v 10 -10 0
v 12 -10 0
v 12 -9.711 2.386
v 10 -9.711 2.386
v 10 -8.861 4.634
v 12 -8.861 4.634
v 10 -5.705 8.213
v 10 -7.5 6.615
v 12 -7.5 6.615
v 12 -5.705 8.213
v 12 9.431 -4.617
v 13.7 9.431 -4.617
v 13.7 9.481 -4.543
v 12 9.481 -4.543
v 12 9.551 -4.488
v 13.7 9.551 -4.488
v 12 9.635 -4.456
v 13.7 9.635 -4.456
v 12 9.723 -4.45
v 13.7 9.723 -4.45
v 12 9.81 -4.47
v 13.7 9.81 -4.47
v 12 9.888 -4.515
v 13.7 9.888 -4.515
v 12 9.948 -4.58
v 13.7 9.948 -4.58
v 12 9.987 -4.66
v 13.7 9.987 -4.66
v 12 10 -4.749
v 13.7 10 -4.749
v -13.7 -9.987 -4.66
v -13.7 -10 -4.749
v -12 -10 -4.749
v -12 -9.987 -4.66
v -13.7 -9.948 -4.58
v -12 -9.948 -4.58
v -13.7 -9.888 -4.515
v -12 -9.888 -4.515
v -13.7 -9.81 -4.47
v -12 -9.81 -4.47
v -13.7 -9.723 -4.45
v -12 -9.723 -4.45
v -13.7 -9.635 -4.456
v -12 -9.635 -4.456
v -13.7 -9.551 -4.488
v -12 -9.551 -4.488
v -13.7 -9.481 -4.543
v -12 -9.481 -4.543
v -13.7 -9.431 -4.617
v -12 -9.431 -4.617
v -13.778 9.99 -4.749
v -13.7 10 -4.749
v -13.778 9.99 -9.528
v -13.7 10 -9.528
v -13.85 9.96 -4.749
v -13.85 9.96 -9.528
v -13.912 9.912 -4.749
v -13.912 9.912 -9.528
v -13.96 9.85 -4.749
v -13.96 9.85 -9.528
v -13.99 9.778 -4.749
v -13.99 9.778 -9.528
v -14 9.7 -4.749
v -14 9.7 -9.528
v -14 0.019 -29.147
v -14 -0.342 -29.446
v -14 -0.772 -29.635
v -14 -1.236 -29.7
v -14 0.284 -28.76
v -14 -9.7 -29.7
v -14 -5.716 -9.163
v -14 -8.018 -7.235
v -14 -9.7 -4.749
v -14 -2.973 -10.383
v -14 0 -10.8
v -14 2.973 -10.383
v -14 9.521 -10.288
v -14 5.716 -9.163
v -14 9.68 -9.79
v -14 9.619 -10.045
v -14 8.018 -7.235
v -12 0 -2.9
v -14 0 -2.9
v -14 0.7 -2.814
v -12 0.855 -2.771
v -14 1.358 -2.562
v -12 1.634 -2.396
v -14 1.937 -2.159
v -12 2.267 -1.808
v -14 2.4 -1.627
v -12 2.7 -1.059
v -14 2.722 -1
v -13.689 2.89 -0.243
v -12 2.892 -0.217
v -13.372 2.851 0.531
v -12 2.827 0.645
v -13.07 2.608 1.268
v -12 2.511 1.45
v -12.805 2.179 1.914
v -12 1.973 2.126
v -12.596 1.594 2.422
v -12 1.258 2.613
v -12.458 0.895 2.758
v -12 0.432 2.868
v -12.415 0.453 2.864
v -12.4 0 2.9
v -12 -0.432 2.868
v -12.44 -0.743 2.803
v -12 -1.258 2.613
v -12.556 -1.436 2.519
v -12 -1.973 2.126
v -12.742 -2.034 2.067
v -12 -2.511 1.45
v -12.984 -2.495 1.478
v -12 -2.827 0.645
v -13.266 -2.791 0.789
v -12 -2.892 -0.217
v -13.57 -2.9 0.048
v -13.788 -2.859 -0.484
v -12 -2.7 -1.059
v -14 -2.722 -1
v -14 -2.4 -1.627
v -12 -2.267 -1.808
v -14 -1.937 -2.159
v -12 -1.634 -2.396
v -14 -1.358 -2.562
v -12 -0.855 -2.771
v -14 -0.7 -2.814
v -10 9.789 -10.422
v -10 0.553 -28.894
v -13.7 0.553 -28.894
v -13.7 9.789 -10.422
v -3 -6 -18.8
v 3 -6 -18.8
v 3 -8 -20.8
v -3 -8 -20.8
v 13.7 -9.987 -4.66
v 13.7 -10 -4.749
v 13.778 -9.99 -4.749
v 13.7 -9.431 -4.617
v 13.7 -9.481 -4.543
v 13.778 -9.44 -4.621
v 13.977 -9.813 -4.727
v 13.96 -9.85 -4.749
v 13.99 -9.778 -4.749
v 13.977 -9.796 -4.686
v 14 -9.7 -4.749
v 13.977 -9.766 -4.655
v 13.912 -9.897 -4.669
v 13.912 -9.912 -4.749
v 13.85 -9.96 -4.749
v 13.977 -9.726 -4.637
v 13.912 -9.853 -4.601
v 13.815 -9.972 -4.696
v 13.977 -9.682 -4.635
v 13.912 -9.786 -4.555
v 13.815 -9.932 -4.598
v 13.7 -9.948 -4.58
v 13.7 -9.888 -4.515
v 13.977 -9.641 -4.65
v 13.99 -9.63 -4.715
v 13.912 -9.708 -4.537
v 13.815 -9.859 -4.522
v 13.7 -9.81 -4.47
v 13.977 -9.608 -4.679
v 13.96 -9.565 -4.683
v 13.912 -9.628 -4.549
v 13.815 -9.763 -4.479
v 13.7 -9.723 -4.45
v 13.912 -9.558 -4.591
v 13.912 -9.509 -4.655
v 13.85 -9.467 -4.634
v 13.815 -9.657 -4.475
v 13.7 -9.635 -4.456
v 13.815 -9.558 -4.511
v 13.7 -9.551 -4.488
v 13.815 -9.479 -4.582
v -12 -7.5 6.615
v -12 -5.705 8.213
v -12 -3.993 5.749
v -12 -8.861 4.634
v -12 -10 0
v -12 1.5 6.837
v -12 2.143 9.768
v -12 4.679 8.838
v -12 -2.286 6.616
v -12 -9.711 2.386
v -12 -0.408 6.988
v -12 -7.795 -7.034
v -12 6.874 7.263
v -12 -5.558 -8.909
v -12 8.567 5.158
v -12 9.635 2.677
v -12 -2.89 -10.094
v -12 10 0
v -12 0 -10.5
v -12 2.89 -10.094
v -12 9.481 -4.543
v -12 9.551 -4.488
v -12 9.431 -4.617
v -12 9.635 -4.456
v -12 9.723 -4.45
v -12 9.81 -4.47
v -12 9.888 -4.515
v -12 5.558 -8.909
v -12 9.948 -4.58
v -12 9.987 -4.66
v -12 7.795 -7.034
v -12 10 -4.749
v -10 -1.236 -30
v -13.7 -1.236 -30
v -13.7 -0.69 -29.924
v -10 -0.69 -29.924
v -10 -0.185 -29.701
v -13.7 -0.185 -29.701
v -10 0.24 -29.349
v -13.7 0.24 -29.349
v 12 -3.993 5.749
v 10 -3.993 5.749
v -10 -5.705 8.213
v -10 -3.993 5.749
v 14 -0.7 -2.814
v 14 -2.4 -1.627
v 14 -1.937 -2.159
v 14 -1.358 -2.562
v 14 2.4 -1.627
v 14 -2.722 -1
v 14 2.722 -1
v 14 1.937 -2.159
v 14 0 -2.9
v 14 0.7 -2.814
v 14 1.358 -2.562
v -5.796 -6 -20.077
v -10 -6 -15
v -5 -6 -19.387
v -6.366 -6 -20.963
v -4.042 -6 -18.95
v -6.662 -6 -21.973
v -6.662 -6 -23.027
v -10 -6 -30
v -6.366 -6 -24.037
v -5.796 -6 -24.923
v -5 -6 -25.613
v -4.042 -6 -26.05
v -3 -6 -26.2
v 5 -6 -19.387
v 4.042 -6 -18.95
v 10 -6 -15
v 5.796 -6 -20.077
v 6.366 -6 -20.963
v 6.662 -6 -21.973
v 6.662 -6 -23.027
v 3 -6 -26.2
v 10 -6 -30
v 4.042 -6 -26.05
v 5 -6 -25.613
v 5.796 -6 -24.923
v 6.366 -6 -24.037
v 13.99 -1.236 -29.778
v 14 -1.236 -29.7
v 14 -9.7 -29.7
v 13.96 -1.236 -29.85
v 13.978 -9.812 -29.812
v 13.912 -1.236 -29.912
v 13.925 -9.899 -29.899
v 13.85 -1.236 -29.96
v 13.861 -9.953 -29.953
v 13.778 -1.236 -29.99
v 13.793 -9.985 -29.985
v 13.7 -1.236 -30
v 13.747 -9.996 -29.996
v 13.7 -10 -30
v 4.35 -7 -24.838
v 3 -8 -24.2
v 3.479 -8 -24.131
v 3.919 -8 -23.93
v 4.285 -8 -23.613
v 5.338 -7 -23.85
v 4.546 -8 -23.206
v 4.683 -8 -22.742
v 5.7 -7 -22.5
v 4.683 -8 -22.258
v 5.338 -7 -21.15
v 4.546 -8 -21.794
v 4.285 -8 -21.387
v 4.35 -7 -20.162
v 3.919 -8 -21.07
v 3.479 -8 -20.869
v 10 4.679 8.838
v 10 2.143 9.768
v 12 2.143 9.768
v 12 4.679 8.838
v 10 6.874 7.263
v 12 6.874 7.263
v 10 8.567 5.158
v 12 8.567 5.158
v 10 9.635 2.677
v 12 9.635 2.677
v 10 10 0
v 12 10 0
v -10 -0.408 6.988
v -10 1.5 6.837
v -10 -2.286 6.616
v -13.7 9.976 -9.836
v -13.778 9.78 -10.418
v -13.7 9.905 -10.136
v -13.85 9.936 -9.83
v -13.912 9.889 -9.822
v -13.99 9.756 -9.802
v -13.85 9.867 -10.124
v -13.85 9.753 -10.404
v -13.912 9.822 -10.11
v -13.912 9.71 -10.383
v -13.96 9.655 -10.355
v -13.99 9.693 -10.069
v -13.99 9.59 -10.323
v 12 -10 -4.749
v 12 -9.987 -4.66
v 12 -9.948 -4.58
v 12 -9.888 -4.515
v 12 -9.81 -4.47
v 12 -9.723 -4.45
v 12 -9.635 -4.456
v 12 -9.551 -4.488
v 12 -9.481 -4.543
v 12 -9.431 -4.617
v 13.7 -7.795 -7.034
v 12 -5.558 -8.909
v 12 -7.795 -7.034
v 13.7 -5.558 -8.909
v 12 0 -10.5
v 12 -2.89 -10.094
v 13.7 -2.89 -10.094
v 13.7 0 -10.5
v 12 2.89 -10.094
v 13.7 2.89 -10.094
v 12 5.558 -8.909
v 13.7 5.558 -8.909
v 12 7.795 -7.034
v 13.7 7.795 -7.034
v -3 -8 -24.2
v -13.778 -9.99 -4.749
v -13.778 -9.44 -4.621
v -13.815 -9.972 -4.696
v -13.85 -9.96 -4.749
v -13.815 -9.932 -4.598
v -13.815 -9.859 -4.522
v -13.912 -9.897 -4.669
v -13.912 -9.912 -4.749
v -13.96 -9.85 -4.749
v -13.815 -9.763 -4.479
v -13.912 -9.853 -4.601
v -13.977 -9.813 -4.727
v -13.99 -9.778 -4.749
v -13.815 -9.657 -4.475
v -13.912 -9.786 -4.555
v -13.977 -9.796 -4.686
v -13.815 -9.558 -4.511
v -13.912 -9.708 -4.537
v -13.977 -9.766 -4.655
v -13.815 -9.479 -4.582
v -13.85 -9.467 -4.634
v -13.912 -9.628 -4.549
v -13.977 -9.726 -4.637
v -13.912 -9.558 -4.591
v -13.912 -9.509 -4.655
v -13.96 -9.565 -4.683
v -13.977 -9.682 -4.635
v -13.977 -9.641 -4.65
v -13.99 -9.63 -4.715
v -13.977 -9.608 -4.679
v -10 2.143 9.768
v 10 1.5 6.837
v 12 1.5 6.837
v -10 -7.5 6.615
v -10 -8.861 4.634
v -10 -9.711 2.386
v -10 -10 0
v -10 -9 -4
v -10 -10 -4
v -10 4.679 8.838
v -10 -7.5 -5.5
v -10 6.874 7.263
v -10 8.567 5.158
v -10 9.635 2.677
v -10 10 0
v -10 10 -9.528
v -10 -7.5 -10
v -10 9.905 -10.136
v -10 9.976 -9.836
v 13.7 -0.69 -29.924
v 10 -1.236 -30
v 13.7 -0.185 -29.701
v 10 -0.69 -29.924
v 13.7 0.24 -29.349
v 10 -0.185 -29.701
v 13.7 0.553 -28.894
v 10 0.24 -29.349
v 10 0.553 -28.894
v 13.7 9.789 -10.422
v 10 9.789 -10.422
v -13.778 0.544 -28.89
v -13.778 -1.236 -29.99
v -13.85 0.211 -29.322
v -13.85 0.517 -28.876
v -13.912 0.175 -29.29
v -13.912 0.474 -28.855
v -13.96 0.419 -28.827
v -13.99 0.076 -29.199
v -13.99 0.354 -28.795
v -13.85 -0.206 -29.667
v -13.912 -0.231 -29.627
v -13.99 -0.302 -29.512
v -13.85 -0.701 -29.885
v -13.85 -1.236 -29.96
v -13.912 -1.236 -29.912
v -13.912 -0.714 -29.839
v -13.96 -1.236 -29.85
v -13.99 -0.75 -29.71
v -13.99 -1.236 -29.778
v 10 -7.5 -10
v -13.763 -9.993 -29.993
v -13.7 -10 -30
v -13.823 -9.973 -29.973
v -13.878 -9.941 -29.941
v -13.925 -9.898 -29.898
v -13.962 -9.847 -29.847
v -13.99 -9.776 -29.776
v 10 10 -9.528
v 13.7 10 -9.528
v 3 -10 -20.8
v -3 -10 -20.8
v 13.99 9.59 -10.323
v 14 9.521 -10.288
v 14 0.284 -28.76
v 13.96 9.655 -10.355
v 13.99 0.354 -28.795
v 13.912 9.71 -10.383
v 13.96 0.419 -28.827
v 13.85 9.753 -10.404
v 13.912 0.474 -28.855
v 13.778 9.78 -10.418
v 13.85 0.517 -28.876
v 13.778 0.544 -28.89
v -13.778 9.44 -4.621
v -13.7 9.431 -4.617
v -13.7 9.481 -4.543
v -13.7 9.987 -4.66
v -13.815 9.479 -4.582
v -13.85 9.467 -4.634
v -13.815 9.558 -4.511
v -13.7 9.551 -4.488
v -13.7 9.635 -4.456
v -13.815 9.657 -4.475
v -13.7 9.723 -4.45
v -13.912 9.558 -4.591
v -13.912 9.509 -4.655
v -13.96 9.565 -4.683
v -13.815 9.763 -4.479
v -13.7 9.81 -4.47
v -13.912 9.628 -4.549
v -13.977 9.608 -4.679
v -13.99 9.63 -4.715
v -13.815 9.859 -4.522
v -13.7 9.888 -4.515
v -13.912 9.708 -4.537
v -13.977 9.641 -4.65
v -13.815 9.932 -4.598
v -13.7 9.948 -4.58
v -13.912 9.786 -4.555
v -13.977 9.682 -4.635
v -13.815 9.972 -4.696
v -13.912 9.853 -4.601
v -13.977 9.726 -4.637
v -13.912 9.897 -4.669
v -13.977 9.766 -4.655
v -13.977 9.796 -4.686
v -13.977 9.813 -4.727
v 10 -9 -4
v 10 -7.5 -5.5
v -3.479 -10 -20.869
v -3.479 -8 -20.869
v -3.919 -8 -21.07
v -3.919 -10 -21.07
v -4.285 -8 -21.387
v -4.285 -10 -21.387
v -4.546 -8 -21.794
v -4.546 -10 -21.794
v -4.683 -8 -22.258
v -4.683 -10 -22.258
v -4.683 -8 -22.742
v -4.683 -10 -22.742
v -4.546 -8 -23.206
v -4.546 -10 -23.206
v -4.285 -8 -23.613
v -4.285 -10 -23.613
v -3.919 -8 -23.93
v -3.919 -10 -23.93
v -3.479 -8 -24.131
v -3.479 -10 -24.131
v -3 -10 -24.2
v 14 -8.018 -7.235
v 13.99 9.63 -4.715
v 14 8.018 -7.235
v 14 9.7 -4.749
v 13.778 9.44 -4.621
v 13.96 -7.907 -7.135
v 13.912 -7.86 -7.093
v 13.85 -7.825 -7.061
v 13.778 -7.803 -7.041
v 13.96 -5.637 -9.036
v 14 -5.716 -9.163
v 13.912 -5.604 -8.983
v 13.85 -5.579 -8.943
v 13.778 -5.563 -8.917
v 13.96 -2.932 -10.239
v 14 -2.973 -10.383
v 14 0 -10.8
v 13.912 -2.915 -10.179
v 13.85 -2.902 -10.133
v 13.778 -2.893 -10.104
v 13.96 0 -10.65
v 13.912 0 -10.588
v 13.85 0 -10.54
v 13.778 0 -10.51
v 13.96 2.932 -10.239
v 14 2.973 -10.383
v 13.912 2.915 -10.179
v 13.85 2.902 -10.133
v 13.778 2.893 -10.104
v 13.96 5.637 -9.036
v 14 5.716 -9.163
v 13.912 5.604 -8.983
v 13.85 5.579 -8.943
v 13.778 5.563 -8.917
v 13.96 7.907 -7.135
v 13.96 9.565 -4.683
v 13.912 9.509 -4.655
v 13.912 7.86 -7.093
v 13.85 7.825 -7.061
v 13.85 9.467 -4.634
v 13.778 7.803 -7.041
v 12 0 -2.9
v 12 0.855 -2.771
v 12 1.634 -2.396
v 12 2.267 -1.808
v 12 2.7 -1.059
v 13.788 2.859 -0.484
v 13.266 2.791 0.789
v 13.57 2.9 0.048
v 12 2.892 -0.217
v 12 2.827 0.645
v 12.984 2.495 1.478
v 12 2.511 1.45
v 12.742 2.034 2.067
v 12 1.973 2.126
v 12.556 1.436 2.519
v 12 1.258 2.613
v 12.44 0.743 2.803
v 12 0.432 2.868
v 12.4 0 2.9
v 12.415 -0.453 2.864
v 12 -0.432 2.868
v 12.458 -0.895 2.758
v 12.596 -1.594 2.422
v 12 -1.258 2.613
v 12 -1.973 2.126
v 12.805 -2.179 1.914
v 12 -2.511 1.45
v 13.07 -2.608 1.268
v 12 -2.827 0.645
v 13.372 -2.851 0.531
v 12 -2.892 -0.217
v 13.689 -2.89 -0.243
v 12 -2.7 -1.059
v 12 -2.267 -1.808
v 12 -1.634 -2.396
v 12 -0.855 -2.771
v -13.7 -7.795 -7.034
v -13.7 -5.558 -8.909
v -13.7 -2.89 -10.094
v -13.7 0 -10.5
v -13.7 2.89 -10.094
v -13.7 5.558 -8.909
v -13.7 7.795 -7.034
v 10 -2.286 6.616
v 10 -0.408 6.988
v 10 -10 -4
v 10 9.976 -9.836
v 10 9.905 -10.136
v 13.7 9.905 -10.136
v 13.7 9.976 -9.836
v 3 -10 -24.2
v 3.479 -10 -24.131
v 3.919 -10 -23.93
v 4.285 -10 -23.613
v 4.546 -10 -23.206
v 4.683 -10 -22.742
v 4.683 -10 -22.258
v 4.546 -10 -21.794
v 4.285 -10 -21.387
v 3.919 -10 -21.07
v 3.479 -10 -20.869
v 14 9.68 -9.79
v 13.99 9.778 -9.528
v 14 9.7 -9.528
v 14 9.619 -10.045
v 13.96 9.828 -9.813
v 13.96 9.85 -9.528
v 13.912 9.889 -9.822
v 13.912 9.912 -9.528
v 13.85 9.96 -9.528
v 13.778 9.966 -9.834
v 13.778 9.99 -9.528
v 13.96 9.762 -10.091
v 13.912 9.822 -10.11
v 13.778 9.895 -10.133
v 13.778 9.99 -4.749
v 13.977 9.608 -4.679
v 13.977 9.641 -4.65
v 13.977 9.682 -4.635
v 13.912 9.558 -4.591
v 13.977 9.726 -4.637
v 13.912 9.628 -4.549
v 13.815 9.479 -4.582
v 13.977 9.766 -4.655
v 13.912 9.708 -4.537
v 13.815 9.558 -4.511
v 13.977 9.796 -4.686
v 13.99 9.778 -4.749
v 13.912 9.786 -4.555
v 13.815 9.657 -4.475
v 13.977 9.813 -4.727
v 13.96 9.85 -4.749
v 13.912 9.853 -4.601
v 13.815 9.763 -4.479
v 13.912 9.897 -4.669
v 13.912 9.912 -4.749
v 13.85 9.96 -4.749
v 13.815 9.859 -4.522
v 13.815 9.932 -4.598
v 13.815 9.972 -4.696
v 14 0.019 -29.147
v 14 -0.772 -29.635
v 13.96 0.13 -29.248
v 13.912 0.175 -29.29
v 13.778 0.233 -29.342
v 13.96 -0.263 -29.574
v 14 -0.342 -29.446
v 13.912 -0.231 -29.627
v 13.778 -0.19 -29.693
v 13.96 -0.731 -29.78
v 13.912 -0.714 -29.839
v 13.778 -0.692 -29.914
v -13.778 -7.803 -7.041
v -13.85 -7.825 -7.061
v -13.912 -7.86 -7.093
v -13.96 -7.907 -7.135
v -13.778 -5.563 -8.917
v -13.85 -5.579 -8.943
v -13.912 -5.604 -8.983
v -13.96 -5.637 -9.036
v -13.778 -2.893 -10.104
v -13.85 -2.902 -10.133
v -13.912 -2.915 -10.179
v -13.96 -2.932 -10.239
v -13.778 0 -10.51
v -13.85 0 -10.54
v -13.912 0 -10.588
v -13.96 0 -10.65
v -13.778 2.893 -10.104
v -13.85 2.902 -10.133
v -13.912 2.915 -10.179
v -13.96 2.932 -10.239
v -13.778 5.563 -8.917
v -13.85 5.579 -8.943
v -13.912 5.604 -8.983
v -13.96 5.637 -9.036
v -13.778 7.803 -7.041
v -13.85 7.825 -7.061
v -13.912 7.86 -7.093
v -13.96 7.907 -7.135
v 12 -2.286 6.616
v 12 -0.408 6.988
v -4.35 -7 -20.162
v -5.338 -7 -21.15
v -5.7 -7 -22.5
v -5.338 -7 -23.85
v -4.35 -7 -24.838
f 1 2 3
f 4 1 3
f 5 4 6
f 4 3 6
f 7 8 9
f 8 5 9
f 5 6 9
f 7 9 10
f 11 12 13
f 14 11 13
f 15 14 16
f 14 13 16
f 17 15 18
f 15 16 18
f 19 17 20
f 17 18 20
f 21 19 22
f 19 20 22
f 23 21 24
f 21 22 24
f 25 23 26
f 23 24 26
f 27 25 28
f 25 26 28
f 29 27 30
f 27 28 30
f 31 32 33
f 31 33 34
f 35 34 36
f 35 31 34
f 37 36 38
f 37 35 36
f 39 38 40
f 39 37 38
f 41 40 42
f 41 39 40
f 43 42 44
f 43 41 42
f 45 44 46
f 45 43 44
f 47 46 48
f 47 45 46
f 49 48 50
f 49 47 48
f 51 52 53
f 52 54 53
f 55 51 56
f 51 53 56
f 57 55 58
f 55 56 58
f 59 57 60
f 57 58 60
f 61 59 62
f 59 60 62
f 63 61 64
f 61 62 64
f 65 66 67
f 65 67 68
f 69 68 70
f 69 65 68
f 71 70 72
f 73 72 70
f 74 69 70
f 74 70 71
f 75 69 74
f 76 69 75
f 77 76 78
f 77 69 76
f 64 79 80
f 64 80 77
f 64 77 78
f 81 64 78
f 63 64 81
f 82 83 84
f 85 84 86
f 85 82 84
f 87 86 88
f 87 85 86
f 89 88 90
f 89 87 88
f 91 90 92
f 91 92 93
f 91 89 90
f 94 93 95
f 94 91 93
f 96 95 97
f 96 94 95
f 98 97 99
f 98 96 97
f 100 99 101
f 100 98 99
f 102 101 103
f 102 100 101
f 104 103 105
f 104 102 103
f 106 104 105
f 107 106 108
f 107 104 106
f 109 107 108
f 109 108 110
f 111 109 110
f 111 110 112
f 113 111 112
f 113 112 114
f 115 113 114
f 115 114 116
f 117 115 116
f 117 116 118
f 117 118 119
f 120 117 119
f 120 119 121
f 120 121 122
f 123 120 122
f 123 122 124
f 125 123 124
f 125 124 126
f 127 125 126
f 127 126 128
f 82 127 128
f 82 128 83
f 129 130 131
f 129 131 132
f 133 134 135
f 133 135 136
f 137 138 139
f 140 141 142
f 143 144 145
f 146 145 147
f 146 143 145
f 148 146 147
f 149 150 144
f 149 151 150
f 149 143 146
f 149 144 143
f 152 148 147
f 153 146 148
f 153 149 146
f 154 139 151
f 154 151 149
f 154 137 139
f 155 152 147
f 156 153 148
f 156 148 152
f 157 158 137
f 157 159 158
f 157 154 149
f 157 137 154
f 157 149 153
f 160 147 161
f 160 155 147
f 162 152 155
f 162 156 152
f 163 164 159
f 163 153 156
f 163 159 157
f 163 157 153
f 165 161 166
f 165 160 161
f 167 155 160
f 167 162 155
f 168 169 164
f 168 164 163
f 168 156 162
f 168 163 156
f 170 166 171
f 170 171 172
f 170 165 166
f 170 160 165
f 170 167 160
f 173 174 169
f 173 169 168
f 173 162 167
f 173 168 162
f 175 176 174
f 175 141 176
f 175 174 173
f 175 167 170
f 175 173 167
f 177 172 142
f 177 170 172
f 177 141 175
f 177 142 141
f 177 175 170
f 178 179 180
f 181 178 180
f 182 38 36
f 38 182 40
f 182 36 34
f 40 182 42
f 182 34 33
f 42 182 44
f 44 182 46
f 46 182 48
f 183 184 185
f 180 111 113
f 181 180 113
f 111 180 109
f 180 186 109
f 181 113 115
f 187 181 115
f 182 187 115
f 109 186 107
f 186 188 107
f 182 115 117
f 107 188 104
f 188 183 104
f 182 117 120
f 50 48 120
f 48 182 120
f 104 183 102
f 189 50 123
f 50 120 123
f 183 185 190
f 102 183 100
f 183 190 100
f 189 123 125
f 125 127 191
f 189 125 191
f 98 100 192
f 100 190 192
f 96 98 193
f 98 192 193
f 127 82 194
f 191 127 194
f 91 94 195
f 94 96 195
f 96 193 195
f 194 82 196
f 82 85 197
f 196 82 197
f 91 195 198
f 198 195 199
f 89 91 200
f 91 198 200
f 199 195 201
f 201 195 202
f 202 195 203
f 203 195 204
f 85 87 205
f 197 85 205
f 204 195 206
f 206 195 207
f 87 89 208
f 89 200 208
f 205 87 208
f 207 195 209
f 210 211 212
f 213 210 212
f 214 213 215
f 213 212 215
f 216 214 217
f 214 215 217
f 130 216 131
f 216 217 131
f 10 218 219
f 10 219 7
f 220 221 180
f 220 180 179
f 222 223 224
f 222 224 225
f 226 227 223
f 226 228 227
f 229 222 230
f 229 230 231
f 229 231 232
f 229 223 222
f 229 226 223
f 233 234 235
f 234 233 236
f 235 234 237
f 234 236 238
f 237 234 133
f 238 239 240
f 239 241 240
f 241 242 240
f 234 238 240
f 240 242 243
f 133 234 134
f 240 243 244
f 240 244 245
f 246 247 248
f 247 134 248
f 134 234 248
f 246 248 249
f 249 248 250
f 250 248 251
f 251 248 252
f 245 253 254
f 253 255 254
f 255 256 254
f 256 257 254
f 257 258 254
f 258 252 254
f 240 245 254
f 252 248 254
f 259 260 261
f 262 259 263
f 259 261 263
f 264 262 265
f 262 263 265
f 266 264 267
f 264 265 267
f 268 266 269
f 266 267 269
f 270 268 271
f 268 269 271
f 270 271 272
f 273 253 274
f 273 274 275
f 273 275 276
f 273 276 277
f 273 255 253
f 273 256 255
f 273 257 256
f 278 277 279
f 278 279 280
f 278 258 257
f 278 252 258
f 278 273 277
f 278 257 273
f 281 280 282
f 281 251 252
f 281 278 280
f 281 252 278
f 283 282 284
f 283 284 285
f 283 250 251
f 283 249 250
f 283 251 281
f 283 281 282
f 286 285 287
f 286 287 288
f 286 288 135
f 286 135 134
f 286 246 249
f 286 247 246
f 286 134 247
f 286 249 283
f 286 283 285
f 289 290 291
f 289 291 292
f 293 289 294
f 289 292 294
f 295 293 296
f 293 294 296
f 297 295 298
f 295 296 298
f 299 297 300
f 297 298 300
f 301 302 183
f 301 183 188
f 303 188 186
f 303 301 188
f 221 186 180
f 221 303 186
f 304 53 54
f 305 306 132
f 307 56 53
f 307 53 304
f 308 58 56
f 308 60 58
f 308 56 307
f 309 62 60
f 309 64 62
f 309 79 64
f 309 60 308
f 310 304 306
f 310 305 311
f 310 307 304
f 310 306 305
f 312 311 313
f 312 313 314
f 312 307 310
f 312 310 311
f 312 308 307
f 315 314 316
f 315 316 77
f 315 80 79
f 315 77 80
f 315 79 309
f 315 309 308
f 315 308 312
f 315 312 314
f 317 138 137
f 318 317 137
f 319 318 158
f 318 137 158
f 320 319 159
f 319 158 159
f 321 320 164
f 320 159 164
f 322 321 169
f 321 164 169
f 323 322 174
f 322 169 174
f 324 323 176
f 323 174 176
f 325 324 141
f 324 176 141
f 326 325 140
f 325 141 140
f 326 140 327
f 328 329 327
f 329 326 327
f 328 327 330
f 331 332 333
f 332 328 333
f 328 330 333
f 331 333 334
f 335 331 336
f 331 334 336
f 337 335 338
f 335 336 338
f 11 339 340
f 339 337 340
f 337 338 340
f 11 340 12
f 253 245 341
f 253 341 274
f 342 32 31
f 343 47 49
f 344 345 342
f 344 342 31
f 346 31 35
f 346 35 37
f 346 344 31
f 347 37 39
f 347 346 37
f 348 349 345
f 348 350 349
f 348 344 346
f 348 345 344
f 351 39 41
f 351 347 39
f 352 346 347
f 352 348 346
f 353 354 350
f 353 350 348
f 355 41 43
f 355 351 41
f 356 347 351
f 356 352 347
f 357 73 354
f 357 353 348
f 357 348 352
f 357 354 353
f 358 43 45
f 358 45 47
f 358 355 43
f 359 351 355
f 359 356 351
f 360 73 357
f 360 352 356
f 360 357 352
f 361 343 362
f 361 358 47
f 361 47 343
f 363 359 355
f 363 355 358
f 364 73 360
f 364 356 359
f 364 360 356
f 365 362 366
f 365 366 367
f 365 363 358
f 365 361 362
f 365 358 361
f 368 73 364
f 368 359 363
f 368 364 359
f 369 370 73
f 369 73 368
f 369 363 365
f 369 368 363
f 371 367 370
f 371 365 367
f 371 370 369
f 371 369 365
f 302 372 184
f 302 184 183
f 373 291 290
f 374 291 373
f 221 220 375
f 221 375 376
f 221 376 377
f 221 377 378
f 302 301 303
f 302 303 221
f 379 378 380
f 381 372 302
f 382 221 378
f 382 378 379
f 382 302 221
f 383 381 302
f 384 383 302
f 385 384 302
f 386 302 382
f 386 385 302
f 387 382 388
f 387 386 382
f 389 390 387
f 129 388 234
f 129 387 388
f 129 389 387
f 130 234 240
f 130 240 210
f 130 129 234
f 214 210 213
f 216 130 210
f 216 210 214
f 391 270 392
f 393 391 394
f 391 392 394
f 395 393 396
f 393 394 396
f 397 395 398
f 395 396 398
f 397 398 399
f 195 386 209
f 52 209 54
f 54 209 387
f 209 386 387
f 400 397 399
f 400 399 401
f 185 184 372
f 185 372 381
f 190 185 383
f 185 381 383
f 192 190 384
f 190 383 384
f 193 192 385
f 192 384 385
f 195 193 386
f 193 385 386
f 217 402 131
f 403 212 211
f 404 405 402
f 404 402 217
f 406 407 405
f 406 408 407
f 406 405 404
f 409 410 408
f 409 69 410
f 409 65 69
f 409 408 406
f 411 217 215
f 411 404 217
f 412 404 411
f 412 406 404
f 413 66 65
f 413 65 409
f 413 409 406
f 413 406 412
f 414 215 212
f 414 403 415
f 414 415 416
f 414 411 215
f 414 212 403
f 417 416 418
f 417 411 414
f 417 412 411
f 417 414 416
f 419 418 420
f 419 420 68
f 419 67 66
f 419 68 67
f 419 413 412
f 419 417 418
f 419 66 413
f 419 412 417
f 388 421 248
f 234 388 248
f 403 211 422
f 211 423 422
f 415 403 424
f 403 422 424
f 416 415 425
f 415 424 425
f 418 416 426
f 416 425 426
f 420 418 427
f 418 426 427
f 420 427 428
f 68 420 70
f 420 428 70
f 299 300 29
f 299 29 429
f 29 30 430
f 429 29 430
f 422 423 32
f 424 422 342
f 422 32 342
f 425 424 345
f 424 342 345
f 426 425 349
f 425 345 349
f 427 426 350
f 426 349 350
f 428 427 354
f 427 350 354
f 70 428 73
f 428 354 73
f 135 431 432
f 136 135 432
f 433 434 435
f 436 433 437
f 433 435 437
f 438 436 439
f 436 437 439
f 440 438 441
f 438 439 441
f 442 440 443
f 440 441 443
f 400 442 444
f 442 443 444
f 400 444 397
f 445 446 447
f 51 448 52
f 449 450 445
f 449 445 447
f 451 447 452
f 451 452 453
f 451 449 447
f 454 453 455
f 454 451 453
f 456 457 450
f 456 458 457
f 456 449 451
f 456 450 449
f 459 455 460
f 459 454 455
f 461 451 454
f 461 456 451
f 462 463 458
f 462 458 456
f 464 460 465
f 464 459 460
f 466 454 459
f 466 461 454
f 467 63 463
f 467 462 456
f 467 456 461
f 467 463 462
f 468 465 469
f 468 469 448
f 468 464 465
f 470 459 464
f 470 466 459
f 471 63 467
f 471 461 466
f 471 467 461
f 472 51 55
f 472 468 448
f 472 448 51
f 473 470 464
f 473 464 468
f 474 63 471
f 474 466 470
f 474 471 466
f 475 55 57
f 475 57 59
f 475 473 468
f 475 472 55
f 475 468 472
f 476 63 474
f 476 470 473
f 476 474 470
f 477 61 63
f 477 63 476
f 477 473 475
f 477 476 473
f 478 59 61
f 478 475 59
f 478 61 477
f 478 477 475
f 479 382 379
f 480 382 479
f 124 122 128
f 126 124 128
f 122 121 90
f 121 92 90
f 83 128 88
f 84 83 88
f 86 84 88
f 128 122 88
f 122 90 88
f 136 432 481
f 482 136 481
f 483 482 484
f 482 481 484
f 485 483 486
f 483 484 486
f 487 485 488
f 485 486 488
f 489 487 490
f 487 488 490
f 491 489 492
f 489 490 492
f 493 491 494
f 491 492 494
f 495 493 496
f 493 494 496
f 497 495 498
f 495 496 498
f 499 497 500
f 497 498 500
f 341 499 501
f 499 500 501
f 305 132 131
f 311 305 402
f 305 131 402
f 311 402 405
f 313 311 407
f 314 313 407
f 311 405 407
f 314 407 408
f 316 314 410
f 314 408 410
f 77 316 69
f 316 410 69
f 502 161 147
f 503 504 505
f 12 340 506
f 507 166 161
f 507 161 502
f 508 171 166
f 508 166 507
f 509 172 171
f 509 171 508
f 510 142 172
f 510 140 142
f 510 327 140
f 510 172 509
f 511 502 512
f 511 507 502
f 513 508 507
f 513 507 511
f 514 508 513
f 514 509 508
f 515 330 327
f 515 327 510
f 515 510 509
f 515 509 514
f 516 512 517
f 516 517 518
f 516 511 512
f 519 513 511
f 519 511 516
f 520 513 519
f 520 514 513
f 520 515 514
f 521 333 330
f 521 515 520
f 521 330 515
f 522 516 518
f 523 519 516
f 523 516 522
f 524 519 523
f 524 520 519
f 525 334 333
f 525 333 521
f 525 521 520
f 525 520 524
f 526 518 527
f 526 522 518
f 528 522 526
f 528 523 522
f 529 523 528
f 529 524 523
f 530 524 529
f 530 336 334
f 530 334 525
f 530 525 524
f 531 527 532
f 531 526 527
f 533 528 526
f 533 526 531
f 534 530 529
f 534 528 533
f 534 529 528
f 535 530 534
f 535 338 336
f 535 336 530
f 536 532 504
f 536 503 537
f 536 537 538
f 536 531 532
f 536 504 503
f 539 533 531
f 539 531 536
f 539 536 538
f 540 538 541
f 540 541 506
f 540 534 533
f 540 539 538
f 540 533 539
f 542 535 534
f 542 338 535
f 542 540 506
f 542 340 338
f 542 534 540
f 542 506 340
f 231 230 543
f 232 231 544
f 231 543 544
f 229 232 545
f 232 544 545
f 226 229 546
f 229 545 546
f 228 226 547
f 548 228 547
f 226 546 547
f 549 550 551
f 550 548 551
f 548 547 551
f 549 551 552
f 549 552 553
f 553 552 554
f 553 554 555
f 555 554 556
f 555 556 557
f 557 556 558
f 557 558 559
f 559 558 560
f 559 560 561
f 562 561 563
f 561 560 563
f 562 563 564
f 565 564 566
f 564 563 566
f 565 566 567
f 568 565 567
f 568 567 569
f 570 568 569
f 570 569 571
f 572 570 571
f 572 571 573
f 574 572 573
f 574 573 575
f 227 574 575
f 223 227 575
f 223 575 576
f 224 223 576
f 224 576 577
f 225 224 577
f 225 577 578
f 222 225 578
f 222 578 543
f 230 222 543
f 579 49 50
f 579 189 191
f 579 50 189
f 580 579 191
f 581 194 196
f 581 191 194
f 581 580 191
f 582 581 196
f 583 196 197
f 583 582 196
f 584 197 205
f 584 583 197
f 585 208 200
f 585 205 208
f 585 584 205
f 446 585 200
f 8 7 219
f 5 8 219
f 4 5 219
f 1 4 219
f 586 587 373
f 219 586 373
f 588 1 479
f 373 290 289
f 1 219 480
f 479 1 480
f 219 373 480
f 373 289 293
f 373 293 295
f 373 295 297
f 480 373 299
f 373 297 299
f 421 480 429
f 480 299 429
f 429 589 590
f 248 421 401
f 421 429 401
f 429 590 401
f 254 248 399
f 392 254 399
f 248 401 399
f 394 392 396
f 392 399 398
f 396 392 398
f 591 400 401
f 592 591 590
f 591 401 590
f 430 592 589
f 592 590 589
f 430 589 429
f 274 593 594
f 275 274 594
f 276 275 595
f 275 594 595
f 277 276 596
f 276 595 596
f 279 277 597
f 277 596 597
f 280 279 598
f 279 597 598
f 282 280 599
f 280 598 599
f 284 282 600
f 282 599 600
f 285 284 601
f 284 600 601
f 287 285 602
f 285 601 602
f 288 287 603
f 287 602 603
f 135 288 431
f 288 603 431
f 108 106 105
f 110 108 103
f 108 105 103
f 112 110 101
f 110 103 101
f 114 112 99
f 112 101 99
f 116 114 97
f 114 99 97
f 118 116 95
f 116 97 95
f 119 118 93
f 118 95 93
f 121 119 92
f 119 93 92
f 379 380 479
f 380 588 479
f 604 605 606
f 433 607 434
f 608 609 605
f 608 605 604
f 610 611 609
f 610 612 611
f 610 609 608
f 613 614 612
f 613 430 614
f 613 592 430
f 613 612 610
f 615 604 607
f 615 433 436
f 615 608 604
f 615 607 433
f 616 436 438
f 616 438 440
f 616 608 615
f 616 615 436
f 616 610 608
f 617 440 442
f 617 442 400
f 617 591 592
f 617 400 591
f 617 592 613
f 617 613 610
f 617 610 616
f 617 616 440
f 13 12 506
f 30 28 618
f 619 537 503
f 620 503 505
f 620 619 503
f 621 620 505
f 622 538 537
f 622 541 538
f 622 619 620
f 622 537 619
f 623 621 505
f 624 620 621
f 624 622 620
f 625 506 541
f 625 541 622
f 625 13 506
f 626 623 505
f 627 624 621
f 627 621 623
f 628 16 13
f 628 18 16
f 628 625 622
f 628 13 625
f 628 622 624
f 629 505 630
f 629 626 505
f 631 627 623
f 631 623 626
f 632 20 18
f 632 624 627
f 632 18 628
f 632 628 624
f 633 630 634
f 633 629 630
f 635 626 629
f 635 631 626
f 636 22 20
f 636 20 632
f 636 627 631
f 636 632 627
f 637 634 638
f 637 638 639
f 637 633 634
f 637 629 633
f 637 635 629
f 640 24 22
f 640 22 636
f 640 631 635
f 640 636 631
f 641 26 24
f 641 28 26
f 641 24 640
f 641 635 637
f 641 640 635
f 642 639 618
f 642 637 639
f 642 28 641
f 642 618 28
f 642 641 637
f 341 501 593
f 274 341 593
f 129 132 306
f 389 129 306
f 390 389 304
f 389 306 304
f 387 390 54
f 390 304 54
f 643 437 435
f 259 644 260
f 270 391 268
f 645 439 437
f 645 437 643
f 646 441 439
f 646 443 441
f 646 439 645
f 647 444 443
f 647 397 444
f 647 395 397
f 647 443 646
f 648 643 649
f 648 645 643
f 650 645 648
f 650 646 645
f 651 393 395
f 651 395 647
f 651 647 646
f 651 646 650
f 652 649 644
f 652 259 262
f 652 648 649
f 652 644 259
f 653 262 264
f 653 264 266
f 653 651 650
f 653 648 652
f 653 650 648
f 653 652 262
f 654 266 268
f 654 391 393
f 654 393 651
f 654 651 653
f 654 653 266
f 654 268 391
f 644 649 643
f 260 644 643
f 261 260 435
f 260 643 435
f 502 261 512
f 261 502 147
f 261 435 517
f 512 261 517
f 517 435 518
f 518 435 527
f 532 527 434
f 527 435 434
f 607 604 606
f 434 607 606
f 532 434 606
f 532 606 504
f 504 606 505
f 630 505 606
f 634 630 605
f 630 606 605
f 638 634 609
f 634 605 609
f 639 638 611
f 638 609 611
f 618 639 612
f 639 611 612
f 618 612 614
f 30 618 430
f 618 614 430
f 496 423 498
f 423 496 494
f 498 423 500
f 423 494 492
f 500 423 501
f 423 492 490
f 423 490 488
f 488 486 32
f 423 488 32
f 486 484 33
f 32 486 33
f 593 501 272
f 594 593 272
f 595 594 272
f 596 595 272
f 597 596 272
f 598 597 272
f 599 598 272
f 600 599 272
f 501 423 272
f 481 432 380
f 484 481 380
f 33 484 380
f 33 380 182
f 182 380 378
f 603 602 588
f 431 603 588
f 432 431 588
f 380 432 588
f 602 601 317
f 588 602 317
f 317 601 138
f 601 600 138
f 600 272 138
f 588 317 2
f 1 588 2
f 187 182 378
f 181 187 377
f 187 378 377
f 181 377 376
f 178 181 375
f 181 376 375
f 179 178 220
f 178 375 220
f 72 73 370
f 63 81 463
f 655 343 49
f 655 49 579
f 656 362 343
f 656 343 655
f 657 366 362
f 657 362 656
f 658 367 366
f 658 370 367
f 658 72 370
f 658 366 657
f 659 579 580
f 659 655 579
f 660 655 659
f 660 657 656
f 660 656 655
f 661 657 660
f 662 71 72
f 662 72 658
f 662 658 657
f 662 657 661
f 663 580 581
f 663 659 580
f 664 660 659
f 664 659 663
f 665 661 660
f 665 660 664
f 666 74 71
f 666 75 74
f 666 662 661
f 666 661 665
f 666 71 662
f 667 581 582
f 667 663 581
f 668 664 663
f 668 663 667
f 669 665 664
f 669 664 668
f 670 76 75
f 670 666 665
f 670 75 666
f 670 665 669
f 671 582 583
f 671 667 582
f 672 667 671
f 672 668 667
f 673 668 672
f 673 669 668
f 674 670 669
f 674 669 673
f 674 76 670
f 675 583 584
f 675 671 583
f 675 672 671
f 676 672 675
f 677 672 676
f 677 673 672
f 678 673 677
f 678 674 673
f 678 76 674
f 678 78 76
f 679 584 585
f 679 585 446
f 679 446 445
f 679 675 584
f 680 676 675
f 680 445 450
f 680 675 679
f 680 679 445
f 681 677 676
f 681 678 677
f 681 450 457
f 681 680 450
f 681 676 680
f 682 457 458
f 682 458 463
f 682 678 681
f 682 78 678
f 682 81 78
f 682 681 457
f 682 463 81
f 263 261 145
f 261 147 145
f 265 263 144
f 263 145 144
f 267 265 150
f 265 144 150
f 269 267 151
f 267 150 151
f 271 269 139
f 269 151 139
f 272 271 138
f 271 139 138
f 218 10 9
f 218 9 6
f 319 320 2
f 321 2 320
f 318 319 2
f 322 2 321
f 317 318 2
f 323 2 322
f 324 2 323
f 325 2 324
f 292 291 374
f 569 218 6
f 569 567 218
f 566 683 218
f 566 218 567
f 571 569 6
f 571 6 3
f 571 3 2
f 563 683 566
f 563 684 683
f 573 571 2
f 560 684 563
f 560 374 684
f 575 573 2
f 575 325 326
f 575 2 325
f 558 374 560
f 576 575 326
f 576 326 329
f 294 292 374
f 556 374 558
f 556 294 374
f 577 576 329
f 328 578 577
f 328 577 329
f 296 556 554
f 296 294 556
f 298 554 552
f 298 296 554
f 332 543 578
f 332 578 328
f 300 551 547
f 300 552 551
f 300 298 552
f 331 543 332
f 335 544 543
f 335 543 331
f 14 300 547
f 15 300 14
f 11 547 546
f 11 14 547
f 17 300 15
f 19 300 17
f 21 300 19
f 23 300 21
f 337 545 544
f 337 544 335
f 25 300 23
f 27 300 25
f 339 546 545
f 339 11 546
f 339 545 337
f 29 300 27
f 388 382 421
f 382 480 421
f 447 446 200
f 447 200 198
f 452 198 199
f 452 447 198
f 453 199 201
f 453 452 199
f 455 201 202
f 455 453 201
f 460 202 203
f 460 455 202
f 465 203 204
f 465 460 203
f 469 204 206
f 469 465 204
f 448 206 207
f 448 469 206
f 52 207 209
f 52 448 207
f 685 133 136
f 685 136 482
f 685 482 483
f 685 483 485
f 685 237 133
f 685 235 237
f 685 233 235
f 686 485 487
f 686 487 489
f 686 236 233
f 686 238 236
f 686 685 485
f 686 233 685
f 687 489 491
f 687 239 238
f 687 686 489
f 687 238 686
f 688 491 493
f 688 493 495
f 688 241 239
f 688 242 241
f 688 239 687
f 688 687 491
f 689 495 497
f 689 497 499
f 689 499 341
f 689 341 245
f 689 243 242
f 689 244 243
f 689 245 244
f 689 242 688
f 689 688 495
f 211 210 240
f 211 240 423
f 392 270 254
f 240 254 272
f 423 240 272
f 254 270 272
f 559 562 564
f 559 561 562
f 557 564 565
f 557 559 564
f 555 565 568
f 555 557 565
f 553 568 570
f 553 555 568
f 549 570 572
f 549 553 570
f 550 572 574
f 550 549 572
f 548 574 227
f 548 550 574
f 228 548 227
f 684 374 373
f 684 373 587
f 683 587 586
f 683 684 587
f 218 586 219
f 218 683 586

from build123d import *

# Parameters (mm, degrees)
BOSS_EXTRUDE1_DEPTH     = 14
SKETCH2_R               = 2.9
CUT_EXTRUDE1_DEPTH      = 48
CUT_EXTRUDE2_DEPTH      = 10
SKETCH6_R               = 10.5
CUT_EXTRUDE4_DEPTH      = 2
SKETCH8_R               = 2.9
BOSS_EXTRUDE2_DEPTH     = 4
CUT_EXTRUDE6_DEPTH      = 39.678159212
FILLET1_R               = 0.3
CUT_EXTRUDE3_DEPTH      = 4
CHAMFER1_SIZE           = 2
FILLET2_R               = 2
FILLET3_R               = 0.3
CUT_EXTRUDE5_DEPTH      = 35.583232932
CUT_EXTRUDE5_DEPTH_BACK = 35.583232932
CHAMFER2_SIZE           = 1.5


with BuildPart() as part:
    # Sketch1 → Boss-Extrude1 (new, symmetric)
    with BuildSketch(Plane(origin=(0, 0, 0), x_dir=(0, 0, -1), z_dir=(1, 0, 0))):
        with BuildLine():
            Line((30, -10), (0, -10))
            ThreePointArc((0, -10), (-10, 0), (0, 10))
            Line((0, 10), (30, 10))
            Line((30, 10), (30, -10))
        make_face()
    extrude(amount=BOSS_EXTRUDE1_DEPTH, both=True)

    # Sketch2 → Cut-Extrude1 (cut)
    with BuildSketch(Plane(origin=(14, 0, 0), x_dir=(0, 0, -1), z_dir=(1, 0, 0))):
        Circle(SKETCH2_R)
        Polygon((30, 0), (10, 10), (30, 10), align=None)
    extrude(amount=-CUT_EXTRUDE1_DEPTH, mode=Mode.SUBTRACT)

    # Sketch4 → Cut-Extrude2 (cut, symmetric)
    with BuildSketch(Plane(origin=(0, 0, 0), x_dir=(0, 0, -1), z_dir=(1, 0, 0))):
        with BuildLine():
            Line((0, -10), (4, -10))
            Line((4, -10), (4, -7.5))
            Line((4, -7.5), (10, -7.5))
            Line((10, -7.5), (15, -6))
            Line((15, -6), (30, -6))
            Line((30, -6), (30, 0))
            Line((30, 0), (10, 10))
            Line((10, 10), (0, 10))
            ThreePointArc((0, 10), (-10, 0), (0, -10))
        make_face()
    extrude(amount=CUT_EXTRUDE2_DEPTH, both=True, mode=Mode.SUBTRACT)

    # Sketch6 → Cut-Extrude4 (cut)
    with BuildSketch(Plane(origin=(-14, 0, 0), x_dir=(0, 0, -1), z_dir=(1, 0, 0))):
        Circle(SKETCH6_R)
    cut_extrude4 = extrude(amount=CUT_EXTRUDE4_DEPTH, mode=Mode.SUBTRACT)

    # Sketch8 → Boss-Extrude2 (add)
    with BuildSketch(Plane(origin=(-10, 0, 0), x_dir=(0, 0, -1), z_dir=(1, 0, 0))):
        Circle(SKETCH8_R)
    boss_extrude2 = extrude(amount=-BOSS_EXTRUDE2_DEPTH)

    # Sketch9 → Cut-Extrude6 (cut, through all)
    with BuildSketch(Plane(origin=(0, 10, 0), x_dir=(1, 0, 0), z_dir=(0, 1, 0))):
        Polygon((-14, 1), (-14, -2.9), (-12.4, -2.9), align=None)
    cut_extrude6 = extrude(amount=-CUT_EXTRUDE6_DEPTH, mode=Mode.SUBTRACT)

    # Mirror1: Cut-Extrude4, Boss-Extrude2, Cut-Extrude6 across plane
    add(cut_extrude4.mirror(Plane(origin=(0, 0, 0), x_dir=(0, 0, 1), z_dir=(1, 0, 0))), mode=Mode.SUBTRACT)
    add(boss_extrude2.mirror(Plane(origin=(0, 0, 0), x_dir=(0, 0, 1), z_dir=(1, 0, 0))))
    add(cut_extrude6.mirror(Plane(origin=(0, 0, 0), x_dir=(0, 0, 1), z_dir=(1, 0, 0))), mode=Mode.SUBTRACT)

    # Fillet1
    fillet1_edges = [part.edges().sort_by_distance(p)[0] for p in [
        (13, -10, -3.201562119),
        (13, 10, -3.201562119),
        (-13, -10, -3.201562119),
        (-13, 10, -3.201562119),
    ]]
    fillet(fillet1_edges, radius=FILLET1_R)

    # Sketch5 → Cut-Extrude3 (cut)
    with BuildSketch(Plane(origin=(0, -10, 0), x_dir=(1, 0, 0), z_dir=(0, 1, 0))):
        with BuildLine():
            Line((-3, 24.2), (3, 24.2))
            ThreePointArc((3, 24.2), (4.7, 22.5), (3, 20.8))
            Line((3, 20.8), (-3, 20.8))
            ThreePointArc((-3, 20.8), (-4.7, 22.5), (-3, 24.2))
        make_face()
    extrude(amount=CUT_EXTRUDE3_DEPTH, mode=Mode.SUBTRACT)

    # Chamfer1
    chamfer1_edges = [part.edges().sort_by_distance(p)[0] for p in [
        (0, -6, -24.2),
        (4.7, -6, -22.5),
        (0, -6, -20.8),
        (-4.7, -6, -22.5),
    ]]
    chamfer(chamfer1_edges, length=CHAMFER1_SIZE)

    # Fillet2
    fillet2_edges = [part.edges().sort_by_distance(p)[0] for p in [
        (-12, 0, -30),
        (-12, 10, -10),
        (12, 10, -10),
        (12, 0, -30),
    ]]
    fillet(fillet2_edges, radius=FILLET2_R)

    # Fillet3
    fillet3_edges = [part.edges().sort_by_distance(p)[0] for p in [
        (14, -5.618033989, -30),
        (14, 0, -10.5),
        (14, -10, -17.374342014),
        (14, -9.76770032, -4.45642273),
        (14, 9.76770032, -4.45642273),
        (-14, -10, -17.374342014),
        (-14, 0, -10.5),
        (-14, 9.76770032, -4.45642273),
        (-14, -9.76770032, -4.45642273),
        (-14, 5.170820393, -19.658359214),
        (-14, 10, -7.138274037),
        (-14, -0.184605753, -29.701301617),
        (-14, 9.946497979, -9.987369886),
        (14, 5.170820393, -19.658359214),
        (14, 10, -7.138274037),
        (14, -0.184605753, -29.701301617),
        (14, 9.946497979, -9.987369886),
        (-14, -5.618033989, -30),
    ]]
    fillet(fillet3_edges, radius=FILLET3_R)

    # Sketch7 → Cut-Extrude5 (cut, two sides: drawn at the far end of the back side and taken through both)
    with BuildSketch(Plane.ZY.offset(-CUT_EXTRUDE5_DEPTH_BACK)):
        with BuildLine():
            Line((9.767710237, 2.142857143), (6.837397166, 1.5))
            ThreePointArc((6.837397166, 1.5), (6.866578014, -1.360186158), (5.749248239, -3.993262411))
            Line((5.749248239, -3.993262411), (8.213211771, -5.704660587))
            ThreePointArc((8.213211771, -5.704660587), (9.809397162, -1.943123082), (9.767710237, 2.142857143))
        make_face()
    extrude(amount=CUT_EXTRUDE5_DEPTH + CUT_EXTRUDE5_DEPTH_BACK, mode=Mode.SUBTRACT)

    # Chamfer2
    chamfer2_edges = [part.edges().sort_by_distance(p)[0] for p in [
        (0, -7.5, -4),
    ]]
    chamfer(chamfer2_edges, length=CHAMFER2_SIZE)


solid = part.part
